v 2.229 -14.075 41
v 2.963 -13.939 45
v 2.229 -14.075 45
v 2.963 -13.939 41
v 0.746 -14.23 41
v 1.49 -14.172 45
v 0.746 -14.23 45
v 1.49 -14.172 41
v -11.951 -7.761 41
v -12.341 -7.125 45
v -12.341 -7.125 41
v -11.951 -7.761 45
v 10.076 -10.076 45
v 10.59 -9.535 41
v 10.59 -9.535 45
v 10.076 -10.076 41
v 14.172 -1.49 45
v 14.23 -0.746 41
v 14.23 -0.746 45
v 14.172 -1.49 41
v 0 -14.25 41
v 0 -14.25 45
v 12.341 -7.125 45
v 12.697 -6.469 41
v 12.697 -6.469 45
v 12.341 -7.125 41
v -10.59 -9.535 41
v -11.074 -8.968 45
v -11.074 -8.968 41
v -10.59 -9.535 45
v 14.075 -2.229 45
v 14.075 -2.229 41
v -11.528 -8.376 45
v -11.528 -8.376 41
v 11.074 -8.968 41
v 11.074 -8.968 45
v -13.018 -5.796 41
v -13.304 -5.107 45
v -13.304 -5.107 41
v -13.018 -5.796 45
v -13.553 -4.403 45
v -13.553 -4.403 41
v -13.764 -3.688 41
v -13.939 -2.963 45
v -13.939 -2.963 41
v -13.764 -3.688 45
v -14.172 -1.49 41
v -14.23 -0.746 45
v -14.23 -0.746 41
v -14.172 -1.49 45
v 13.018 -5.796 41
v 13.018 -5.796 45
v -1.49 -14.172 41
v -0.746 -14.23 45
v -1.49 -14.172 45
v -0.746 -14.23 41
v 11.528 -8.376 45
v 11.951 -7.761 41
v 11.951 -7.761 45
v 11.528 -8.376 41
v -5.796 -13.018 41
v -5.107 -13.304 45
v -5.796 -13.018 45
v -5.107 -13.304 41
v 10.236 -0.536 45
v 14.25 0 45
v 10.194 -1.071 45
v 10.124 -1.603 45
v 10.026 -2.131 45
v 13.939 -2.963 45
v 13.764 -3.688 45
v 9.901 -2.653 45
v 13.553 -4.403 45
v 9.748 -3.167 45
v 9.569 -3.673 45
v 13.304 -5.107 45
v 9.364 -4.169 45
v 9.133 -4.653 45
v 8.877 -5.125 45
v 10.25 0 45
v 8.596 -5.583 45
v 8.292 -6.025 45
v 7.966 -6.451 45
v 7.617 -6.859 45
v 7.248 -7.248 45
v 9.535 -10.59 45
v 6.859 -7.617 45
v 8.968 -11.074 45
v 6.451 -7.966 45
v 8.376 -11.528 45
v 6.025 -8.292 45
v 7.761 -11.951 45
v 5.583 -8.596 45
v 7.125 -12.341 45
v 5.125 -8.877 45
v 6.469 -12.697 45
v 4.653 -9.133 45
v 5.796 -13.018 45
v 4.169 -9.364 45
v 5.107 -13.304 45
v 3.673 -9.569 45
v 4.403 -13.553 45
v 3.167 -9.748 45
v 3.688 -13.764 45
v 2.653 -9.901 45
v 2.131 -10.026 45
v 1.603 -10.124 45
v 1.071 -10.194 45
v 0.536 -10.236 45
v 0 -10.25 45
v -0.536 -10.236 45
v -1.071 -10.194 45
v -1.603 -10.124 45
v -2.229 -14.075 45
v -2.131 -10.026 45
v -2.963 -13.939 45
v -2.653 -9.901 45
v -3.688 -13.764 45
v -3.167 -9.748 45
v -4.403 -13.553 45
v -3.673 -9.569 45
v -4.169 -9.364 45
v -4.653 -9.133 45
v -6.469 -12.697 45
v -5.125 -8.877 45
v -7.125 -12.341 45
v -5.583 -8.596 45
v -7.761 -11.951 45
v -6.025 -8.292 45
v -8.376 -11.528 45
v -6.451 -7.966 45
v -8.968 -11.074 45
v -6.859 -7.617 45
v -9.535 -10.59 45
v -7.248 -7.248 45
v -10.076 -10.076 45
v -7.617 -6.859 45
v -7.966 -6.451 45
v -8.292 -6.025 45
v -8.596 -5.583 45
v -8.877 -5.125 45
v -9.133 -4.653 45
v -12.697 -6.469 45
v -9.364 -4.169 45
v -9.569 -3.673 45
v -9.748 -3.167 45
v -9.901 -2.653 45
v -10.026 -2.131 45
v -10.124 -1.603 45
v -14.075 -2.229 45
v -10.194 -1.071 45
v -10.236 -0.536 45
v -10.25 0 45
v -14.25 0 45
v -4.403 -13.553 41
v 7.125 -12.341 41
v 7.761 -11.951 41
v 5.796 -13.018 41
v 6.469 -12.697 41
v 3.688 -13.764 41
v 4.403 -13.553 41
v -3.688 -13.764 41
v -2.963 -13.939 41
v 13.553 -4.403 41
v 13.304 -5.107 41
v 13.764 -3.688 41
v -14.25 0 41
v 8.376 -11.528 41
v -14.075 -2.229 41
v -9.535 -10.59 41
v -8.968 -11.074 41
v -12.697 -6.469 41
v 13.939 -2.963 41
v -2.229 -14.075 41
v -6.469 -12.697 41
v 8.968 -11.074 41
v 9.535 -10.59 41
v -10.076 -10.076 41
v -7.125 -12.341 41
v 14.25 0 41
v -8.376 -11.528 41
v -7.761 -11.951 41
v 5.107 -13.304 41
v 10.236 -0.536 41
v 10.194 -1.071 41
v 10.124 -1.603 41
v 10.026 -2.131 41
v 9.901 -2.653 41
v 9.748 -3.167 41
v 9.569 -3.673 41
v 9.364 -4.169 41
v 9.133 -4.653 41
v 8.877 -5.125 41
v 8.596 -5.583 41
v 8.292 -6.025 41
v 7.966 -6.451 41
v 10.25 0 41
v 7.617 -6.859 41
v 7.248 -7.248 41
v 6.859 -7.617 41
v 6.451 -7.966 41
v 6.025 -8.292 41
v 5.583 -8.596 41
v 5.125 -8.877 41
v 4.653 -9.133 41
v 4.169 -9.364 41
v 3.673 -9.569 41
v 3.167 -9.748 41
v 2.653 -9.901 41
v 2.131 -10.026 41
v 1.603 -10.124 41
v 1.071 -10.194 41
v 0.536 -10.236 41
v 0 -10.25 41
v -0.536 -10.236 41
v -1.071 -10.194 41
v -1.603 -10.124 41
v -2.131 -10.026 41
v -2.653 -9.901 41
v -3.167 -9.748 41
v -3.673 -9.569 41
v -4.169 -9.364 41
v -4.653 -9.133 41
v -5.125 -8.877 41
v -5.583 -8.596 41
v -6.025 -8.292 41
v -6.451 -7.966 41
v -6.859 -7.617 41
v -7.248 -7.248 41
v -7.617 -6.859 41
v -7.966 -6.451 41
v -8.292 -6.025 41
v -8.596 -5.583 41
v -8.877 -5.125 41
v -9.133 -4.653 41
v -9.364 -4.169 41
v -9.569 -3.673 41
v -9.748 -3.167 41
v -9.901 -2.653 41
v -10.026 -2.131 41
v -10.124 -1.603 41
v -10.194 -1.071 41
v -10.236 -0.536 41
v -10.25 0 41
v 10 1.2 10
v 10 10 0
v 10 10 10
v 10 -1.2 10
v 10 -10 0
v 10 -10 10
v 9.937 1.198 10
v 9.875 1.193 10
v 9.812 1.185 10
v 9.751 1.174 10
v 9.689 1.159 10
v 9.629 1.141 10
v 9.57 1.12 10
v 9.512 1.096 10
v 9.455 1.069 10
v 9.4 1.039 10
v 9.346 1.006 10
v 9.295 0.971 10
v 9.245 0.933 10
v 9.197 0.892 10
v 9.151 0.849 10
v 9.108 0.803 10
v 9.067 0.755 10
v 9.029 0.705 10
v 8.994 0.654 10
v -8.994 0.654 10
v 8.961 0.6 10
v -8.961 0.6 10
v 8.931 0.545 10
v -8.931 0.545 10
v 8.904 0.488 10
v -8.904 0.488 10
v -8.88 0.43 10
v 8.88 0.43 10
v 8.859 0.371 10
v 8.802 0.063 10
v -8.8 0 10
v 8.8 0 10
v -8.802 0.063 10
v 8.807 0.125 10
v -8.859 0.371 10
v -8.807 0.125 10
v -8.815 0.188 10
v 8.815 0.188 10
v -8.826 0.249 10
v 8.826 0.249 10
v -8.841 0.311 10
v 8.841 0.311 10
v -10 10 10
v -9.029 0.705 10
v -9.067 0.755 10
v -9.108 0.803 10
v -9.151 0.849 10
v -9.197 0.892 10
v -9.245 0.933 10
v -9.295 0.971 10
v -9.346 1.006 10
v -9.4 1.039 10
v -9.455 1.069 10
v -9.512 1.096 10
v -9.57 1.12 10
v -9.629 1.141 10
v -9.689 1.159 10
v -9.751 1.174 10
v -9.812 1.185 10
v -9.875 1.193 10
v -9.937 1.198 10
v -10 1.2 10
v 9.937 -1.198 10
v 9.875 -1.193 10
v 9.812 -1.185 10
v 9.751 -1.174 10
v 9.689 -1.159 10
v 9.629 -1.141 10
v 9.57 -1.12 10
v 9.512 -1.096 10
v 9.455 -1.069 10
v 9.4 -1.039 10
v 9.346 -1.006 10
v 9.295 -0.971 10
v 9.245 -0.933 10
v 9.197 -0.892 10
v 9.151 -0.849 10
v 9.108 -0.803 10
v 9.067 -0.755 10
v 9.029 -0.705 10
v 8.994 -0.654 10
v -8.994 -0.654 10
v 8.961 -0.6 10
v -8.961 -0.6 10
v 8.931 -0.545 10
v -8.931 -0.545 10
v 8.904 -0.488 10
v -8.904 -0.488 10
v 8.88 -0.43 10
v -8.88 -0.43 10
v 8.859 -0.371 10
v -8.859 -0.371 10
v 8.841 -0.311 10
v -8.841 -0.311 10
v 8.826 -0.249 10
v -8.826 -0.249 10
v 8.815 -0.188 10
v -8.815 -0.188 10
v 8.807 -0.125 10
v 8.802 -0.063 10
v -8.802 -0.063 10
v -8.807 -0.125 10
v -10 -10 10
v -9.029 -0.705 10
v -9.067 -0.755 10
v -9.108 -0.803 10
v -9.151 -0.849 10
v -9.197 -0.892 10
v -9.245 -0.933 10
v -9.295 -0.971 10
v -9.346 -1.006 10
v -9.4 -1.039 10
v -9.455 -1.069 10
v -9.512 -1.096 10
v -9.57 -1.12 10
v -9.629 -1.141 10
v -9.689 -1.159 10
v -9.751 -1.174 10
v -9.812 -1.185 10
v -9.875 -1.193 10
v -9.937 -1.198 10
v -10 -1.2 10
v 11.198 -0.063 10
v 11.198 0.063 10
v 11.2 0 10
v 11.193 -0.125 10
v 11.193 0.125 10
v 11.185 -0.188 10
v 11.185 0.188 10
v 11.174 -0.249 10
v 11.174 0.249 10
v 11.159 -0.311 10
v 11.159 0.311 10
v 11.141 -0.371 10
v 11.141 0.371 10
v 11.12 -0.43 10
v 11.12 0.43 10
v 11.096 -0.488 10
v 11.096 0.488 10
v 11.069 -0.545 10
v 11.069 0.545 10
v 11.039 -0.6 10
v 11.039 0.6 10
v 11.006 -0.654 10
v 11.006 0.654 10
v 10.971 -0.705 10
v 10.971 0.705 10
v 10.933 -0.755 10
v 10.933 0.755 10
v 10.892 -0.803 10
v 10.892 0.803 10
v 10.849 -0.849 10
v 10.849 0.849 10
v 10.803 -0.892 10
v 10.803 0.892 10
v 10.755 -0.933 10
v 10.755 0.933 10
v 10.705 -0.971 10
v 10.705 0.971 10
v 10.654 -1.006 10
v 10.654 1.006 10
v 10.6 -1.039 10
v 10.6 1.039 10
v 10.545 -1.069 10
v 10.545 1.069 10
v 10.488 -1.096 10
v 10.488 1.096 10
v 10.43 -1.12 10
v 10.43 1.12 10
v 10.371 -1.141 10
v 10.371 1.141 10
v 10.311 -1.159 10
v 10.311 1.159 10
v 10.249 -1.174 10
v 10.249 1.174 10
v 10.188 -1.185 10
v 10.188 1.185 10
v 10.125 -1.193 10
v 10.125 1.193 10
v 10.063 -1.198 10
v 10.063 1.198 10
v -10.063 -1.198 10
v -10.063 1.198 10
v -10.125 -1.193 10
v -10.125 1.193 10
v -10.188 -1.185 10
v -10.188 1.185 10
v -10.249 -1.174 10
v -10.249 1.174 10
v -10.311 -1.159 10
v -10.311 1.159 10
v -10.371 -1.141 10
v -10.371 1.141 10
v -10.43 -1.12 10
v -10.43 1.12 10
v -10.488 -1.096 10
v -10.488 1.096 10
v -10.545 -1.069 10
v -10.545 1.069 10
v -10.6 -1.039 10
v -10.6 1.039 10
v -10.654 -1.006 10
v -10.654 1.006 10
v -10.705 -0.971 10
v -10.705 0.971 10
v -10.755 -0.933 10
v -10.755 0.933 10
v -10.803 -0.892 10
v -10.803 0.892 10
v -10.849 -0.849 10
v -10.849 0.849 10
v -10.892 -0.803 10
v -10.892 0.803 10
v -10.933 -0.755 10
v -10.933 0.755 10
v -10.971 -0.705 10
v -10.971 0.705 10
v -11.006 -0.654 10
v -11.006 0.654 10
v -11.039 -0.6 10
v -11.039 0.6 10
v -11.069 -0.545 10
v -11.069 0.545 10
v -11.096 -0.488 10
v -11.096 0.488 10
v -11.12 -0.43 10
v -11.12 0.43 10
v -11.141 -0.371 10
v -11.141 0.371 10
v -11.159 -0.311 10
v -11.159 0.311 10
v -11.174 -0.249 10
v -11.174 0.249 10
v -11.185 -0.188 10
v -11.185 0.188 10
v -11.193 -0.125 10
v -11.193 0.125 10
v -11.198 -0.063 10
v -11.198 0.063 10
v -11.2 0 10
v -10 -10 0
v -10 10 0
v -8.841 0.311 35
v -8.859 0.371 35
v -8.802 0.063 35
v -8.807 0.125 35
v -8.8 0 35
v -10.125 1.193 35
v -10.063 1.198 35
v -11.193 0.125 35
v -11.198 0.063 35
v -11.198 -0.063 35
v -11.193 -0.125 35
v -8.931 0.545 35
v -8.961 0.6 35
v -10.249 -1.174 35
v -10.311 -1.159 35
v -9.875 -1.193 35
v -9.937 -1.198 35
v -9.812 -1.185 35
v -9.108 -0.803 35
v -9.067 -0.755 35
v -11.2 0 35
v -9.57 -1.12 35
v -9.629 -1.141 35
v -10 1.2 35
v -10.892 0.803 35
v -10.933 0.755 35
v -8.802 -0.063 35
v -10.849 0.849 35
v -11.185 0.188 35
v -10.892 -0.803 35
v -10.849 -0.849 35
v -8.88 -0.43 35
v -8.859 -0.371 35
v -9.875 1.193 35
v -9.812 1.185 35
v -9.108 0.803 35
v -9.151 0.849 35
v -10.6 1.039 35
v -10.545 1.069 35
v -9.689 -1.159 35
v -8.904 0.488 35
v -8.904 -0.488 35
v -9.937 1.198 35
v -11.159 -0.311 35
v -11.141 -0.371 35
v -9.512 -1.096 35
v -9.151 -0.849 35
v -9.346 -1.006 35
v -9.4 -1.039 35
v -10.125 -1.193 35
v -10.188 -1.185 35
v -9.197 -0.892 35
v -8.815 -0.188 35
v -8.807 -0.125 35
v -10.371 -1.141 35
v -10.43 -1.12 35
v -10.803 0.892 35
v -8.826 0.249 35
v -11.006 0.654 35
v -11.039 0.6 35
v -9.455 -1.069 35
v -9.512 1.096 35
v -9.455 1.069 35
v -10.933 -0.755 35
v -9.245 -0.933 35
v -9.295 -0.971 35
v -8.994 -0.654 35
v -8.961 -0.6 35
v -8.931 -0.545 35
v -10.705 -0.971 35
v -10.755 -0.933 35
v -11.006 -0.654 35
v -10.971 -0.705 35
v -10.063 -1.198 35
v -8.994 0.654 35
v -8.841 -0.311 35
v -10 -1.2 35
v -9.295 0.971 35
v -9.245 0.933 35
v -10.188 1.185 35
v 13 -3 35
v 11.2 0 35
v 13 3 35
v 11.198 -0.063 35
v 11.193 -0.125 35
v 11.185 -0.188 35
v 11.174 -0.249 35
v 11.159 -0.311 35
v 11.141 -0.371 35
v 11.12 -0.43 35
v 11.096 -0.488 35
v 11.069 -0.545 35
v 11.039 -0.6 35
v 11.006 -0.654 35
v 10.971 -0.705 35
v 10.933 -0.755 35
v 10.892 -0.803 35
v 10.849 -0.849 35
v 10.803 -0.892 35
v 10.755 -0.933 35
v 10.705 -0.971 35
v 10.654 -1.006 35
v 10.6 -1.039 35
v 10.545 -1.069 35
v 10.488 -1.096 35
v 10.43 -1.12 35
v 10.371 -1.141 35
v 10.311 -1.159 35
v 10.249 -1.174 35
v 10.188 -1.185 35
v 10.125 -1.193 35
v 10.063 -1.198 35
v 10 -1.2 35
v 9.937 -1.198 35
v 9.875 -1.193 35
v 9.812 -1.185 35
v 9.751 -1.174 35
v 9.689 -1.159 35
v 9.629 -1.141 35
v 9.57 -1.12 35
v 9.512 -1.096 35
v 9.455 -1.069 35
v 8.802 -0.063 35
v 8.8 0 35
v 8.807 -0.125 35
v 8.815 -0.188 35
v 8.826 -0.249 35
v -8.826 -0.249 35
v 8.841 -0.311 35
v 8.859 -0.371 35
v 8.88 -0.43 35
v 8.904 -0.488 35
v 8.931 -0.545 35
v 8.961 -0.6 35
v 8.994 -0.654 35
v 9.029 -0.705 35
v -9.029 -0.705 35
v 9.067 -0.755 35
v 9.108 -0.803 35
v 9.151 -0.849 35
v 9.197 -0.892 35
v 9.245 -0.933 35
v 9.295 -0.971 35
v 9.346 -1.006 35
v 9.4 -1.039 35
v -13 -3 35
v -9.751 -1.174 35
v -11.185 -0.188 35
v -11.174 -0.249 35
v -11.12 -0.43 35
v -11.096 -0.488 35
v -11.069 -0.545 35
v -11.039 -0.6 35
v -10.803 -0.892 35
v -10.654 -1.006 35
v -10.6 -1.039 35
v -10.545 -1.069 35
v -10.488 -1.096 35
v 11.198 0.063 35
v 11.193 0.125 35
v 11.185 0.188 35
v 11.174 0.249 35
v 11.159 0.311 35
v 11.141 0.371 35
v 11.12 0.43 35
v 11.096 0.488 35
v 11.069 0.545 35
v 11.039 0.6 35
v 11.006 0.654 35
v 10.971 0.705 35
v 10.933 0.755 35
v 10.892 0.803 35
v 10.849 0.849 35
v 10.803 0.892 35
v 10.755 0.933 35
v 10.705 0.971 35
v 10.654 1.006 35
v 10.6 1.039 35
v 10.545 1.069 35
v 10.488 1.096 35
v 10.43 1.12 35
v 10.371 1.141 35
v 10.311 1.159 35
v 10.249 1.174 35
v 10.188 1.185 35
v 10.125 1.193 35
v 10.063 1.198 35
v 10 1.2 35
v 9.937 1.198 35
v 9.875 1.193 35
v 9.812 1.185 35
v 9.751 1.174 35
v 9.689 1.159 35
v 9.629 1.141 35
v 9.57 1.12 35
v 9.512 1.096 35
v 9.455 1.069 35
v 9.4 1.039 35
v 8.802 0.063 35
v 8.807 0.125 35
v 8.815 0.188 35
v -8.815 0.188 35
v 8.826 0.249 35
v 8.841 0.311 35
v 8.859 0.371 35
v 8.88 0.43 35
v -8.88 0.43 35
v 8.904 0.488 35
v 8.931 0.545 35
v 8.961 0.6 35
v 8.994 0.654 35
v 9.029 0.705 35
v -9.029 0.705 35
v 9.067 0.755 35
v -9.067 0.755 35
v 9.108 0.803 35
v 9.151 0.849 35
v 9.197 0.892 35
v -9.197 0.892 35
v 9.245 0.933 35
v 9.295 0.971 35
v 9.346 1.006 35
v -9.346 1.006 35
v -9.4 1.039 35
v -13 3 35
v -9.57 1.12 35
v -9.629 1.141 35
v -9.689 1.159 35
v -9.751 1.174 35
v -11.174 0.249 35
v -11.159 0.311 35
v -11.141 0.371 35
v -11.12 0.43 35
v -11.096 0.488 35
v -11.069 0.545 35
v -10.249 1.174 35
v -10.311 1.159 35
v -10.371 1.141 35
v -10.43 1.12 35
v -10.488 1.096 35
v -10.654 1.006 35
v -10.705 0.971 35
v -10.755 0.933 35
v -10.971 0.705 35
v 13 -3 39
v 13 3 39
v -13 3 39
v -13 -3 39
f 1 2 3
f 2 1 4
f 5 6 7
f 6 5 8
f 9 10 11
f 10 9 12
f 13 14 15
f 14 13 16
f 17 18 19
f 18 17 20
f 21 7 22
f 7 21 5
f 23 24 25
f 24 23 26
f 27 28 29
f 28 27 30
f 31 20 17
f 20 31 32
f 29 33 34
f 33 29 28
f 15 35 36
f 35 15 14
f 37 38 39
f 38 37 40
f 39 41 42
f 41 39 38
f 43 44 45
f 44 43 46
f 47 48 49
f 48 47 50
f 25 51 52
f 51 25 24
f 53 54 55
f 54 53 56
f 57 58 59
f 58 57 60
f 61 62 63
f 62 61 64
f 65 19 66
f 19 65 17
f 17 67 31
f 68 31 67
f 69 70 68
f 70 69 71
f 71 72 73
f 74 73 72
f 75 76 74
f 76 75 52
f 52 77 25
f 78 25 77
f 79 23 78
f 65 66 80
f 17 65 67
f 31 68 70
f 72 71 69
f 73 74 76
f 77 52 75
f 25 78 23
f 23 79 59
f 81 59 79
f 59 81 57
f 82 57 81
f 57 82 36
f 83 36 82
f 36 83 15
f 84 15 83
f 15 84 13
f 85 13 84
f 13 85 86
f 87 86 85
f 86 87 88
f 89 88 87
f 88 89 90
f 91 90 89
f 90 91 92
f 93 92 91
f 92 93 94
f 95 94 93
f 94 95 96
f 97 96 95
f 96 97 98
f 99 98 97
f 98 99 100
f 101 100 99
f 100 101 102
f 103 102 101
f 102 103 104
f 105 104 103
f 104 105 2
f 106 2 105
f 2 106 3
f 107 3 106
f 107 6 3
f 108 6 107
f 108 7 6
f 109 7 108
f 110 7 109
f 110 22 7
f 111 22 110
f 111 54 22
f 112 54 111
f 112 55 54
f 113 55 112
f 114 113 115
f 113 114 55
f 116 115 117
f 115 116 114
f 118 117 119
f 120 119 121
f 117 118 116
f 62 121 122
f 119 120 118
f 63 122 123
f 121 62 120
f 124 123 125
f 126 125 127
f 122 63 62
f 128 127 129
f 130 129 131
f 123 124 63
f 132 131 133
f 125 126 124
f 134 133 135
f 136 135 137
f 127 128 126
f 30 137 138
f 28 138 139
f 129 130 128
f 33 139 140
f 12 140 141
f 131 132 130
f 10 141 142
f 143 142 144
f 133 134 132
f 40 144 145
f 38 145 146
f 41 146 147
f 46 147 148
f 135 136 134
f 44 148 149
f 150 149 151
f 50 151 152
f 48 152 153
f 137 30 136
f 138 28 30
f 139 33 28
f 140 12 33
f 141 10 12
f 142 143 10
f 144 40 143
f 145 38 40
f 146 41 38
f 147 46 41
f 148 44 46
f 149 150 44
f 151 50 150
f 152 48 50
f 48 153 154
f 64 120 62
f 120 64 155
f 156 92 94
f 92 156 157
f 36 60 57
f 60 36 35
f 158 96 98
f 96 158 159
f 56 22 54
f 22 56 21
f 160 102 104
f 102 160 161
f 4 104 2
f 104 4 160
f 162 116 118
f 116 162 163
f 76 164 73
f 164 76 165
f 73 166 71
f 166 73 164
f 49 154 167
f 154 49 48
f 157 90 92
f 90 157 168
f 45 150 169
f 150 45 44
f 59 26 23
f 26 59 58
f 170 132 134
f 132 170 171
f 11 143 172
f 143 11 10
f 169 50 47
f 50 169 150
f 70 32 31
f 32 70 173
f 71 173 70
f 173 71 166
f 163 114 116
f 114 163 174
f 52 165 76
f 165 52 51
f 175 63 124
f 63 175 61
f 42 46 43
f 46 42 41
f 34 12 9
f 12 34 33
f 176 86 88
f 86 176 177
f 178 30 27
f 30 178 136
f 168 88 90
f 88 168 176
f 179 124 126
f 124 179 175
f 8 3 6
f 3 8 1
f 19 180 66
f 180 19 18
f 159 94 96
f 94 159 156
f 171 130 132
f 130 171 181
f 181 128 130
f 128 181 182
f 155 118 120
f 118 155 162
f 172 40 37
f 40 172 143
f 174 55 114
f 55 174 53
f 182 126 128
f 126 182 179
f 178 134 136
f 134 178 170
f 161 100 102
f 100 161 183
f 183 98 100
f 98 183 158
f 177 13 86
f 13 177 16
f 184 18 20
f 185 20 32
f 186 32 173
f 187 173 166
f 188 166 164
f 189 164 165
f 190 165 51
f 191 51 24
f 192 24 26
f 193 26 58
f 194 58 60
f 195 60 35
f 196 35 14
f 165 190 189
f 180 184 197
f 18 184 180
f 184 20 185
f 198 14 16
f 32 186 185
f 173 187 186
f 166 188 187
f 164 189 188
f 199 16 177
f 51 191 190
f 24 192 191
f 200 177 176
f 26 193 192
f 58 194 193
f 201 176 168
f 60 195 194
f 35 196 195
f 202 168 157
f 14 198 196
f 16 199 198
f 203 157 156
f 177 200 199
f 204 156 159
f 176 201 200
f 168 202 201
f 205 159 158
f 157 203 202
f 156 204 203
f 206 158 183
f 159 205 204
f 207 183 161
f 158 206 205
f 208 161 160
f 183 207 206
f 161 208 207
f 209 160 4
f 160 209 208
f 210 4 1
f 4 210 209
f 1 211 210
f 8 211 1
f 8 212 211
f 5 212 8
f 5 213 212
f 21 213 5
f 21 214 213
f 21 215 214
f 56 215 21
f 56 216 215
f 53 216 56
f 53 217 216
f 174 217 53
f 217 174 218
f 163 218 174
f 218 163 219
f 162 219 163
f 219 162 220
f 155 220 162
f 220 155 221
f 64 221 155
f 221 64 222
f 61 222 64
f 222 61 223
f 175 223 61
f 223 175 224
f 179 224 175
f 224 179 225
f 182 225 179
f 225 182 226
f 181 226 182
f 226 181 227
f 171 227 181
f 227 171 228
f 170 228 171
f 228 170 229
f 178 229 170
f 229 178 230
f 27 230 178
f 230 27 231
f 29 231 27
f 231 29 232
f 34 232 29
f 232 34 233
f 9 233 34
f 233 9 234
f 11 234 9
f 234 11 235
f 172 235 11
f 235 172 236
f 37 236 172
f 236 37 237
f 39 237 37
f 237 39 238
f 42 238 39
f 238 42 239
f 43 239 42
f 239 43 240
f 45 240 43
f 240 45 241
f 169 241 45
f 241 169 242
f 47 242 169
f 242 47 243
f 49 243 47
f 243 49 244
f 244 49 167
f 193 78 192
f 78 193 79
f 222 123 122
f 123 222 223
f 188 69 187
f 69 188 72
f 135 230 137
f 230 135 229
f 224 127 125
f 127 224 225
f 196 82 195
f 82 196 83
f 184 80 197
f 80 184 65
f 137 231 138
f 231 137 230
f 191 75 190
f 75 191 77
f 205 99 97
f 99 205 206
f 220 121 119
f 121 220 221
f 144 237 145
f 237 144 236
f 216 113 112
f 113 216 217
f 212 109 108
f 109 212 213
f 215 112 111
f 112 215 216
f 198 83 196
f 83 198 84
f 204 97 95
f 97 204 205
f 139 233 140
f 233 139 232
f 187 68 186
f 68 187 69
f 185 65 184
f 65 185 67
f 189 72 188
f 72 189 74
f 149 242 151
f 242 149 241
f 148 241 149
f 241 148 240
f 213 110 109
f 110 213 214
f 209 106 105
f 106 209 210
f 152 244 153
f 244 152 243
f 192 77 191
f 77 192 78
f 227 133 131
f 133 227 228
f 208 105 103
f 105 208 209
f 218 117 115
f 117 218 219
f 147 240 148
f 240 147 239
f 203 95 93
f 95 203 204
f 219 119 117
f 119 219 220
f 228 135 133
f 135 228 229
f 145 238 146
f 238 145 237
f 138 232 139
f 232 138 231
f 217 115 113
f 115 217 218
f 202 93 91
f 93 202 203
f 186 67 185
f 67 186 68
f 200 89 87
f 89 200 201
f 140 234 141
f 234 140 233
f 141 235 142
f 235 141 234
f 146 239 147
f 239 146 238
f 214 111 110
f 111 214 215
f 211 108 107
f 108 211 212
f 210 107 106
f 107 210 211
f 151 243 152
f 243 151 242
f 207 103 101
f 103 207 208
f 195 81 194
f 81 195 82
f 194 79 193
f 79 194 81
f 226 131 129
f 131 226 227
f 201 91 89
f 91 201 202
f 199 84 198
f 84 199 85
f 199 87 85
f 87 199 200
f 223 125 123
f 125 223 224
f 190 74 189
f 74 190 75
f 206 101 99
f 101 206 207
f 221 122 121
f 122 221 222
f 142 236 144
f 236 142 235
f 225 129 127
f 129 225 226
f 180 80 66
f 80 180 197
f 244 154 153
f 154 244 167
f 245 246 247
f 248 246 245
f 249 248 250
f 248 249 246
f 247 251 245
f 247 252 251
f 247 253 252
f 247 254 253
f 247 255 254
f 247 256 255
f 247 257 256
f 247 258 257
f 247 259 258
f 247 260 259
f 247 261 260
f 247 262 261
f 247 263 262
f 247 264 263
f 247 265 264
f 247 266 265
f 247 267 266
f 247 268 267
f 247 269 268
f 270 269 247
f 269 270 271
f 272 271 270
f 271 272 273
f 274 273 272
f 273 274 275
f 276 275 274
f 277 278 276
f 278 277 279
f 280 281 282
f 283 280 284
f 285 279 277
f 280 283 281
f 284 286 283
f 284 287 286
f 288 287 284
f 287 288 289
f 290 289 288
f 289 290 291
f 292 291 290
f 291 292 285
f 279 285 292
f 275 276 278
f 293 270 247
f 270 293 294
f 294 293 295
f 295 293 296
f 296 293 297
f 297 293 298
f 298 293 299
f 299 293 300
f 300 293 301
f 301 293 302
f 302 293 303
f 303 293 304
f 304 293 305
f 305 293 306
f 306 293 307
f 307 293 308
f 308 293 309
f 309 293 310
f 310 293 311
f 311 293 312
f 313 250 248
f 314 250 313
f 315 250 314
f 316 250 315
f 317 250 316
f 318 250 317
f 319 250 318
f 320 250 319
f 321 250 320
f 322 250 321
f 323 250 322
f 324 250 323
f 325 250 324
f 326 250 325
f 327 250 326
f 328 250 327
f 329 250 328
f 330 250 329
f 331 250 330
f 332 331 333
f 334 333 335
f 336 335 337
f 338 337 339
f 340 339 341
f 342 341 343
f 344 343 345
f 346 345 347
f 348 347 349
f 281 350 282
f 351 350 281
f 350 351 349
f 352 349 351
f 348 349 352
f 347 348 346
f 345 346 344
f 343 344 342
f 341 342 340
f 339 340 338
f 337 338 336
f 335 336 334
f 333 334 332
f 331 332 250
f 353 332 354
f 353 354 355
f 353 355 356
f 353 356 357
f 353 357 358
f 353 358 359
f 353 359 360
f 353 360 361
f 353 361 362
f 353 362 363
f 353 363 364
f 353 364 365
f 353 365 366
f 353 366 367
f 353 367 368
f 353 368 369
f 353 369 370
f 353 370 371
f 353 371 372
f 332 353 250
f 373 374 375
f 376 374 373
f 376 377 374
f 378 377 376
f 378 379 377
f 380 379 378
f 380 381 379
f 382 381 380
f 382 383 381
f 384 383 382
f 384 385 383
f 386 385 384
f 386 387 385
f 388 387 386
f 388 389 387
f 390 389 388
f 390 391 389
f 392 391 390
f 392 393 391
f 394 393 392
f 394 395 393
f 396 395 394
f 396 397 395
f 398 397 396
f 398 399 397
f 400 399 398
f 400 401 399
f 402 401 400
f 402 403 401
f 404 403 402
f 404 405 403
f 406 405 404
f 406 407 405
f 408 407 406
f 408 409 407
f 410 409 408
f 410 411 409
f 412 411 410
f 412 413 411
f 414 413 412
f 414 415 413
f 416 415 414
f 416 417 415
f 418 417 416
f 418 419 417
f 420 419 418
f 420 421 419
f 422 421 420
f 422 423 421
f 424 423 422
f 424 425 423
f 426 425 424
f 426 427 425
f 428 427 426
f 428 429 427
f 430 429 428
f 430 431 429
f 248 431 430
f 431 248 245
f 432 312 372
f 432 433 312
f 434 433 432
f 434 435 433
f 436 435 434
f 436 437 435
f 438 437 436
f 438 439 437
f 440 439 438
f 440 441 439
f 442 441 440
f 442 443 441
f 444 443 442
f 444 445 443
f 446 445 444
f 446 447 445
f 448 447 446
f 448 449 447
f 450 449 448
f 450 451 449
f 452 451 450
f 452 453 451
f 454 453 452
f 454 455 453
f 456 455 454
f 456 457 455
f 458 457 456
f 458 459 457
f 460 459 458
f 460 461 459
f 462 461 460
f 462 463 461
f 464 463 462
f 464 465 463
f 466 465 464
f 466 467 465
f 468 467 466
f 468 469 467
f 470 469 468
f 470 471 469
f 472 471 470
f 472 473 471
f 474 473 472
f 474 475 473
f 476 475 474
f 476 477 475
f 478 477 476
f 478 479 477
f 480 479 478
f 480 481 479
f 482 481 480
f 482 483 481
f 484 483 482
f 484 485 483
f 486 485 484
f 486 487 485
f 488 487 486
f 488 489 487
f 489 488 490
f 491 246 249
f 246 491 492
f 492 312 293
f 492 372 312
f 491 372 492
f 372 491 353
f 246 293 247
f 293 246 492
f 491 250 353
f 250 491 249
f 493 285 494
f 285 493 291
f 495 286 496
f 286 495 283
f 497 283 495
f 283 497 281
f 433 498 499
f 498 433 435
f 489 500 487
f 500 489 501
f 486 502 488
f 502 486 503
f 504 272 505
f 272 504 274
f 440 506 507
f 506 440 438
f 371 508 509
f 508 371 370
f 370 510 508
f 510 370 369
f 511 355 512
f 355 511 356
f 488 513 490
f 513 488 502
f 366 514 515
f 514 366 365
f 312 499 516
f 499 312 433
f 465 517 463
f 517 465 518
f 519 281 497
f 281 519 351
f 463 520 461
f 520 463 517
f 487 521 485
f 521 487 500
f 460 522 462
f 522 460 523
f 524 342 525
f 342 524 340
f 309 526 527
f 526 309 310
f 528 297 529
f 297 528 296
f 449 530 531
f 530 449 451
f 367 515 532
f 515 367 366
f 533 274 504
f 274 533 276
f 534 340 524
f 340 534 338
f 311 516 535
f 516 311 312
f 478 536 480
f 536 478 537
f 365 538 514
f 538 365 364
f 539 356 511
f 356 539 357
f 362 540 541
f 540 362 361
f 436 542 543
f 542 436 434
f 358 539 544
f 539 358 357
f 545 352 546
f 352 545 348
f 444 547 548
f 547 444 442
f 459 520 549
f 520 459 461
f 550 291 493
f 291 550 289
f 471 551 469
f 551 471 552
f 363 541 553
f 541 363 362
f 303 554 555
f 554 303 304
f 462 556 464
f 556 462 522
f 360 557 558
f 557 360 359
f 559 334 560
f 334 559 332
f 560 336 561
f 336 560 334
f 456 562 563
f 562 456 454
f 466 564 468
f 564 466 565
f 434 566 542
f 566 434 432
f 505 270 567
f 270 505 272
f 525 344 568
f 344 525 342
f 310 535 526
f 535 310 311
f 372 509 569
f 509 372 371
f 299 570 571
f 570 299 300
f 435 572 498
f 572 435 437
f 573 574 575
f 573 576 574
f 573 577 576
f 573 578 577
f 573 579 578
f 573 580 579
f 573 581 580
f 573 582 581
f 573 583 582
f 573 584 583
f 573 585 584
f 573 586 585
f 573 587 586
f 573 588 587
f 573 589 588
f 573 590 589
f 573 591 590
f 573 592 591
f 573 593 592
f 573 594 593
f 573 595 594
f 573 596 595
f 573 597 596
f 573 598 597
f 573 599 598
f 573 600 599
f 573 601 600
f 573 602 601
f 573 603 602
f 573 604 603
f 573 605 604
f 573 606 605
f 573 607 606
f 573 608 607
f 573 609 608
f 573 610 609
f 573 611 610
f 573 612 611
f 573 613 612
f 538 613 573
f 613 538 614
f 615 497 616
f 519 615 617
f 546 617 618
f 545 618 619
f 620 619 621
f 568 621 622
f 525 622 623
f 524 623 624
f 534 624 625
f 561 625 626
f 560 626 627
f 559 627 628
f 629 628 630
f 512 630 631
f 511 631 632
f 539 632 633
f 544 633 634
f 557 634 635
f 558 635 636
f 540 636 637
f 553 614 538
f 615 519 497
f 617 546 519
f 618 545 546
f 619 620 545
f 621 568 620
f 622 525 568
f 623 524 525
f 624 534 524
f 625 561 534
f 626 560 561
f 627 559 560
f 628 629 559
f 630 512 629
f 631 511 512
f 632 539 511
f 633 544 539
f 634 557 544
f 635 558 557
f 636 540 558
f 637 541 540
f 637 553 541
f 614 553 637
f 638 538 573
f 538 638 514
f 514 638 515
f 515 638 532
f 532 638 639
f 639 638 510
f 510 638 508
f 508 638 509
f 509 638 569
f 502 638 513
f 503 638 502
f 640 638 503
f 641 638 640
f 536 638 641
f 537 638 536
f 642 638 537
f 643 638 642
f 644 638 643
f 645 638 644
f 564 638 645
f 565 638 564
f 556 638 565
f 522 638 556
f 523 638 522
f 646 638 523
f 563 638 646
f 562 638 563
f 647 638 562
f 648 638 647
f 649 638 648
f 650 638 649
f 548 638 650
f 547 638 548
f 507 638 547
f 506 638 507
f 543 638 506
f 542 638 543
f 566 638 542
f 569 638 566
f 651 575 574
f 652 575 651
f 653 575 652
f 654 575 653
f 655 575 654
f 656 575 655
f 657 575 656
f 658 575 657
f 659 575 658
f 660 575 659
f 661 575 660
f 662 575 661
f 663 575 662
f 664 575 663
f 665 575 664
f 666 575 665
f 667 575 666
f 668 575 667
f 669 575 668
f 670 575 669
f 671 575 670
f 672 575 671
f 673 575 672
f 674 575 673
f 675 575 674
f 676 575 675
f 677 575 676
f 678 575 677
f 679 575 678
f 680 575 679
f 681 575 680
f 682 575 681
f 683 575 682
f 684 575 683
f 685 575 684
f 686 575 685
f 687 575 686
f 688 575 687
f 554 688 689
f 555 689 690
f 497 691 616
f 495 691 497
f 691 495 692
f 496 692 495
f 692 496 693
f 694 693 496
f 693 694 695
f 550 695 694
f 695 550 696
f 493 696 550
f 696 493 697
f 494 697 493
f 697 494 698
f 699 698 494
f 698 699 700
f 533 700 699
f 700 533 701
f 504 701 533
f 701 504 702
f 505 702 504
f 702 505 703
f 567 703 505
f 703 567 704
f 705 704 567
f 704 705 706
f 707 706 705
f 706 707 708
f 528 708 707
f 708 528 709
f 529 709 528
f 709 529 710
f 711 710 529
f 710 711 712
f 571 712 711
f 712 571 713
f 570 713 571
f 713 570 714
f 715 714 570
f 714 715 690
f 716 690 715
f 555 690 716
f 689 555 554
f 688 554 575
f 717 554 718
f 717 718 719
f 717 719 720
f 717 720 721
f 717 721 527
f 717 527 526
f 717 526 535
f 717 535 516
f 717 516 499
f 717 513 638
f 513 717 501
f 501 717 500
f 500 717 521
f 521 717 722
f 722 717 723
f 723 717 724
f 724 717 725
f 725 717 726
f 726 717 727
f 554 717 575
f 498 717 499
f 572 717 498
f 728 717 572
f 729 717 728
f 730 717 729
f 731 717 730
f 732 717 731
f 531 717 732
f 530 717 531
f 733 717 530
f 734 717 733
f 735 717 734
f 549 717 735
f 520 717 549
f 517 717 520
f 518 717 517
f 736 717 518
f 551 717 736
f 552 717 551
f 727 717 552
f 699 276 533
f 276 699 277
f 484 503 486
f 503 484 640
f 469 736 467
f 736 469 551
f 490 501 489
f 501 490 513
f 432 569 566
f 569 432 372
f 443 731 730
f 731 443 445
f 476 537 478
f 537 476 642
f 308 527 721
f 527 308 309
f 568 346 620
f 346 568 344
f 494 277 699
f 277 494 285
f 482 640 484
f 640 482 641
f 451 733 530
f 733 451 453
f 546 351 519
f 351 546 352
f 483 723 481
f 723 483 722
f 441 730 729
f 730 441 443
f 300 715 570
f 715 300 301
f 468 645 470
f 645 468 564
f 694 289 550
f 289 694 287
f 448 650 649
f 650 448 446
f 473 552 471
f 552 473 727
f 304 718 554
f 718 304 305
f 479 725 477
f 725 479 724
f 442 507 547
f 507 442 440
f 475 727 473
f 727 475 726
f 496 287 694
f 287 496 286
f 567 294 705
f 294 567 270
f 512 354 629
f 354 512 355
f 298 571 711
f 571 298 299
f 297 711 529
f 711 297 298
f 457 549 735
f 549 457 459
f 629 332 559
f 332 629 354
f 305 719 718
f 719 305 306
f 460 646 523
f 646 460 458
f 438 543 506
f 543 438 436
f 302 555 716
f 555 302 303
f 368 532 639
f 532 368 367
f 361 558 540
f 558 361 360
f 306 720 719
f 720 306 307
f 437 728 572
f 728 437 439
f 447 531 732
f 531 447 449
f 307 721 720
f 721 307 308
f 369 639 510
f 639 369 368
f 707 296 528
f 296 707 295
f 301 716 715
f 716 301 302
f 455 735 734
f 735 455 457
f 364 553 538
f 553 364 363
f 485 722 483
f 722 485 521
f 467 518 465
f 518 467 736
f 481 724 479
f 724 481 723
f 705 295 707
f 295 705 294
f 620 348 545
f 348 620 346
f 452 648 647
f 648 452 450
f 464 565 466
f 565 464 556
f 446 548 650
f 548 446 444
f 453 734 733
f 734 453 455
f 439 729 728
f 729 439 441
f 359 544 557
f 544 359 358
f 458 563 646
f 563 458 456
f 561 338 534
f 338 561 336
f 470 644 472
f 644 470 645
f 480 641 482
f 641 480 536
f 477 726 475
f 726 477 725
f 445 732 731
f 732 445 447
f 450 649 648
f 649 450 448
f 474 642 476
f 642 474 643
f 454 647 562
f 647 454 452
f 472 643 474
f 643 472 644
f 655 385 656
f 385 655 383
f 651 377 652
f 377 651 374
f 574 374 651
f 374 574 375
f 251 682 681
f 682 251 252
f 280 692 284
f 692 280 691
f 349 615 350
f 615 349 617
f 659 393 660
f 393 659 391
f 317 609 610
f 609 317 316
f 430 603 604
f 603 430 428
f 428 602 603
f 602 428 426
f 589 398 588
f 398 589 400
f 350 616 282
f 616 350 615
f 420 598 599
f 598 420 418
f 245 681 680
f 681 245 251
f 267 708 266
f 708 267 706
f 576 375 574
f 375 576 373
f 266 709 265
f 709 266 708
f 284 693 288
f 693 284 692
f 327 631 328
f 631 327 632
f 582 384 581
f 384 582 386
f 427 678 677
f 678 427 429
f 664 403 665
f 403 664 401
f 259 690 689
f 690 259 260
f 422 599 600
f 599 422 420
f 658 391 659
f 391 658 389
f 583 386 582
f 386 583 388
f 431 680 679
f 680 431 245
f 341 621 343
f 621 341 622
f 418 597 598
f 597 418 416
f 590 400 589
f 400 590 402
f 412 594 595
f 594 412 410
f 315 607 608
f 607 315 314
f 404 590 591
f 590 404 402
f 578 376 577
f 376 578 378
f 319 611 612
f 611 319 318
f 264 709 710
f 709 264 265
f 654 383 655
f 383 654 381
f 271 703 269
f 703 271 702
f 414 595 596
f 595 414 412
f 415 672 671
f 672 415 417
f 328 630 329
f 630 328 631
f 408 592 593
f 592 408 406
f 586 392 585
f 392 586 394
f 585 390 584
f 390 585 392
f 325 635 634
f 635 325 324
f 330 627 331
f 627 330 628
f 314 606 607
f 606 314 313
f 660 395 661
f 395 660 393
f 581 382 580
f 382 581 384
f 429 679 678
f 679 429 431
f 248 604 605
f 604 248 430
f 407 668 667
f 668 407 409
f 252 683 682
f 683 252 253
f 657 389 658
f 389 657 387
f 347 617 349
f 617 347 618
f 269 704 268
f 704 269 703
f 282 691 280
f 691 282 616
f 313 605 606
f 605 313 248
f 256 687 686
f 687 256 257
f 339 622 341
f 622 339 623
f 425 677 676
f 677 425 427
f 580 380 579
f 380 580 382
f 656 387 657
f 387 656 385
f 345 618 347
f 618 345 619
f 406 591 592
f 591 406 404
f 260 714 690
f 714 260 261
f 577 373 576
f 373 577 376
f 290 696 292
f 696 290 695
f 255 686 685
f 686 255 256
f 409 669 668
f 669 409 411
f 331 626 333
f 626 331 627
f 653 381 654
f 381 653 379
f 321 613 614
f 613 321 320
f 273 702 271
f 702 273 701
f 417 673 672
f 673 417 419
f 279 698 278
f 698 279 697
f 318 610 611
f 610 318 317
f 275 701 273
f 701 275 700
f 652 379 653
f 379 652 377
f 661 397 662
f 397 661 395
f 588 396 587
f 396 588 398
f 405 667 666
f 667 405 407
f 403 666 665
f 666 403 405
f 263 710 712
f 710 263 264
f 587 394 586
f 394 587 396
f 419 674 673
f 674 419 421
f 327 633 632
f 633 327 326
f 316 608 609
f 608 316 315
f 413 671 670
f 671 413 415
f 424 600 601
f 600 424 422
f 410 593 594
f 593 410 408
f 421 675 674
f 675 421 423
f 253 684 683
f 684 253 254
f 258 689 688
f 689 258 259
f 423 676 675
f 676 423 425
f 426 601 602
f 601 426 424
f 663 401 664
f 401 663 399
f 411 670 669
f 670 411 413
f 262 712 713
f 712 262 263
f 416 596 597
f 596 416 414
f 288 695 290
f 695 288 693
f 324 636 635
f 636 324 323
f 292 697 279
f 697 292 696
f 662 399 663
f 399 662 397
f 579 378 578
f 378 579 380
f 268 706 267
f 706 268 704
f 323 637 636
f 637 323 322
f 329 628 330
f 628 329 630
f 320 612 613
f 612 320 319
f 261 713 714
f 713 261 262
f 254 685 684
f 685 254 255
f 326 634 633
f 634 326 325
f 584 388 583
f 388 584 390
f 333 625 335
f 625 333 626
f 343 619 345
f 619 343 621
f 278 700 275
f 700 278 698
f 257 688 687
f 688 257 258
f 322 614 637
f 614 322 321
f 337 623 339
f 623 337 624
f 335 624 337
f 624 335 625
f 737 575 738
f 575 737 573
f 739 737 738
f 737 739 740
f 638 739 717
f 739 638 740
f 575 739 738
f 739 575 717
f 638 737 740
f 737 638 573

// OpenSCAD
//
// Dual-Probe Assembly with Semi-Circular Servo Horn (Fixed Syntax)
// The horn covers both probes when centered and frees the left probe when rotated right.
//
// Author: ChatGPT
//

// ===== PARAMETERS =====
probe_dia = 2.0;
spring_od = 4.5;
probe_spacing = 20.0;
guide_height = 25.0;
base_thickness = 10.0;
crossbar_thickness = 4.0;

horn_outer_R = probe_spacing / 2 + spring_od / 2 + 2.0;
horn_radial_thk = 4.0;
horn_z_thk = 4.0;
horn_z_offset = 2.0;
pivot_hole_dia = 4.0;

pocket_arc_angle = 50;    // how wide the cutout is
pocket_radial_extra = 6;  // how deep inward it goes
pocket_depth = 3;         // how far up into horn it cuts

$fn = 120;

// ===== MODULES =====

module base_plate() {
    translate([-10, -10, 0])
        cube([20, 20, base_thickness]);
}

module probe_guide(xoff) {
    translate([xoff, 0, base_thickness])
        cylinder(h = guide_height, d = probe_dia + 0.4);
}

module crossbar() {
    translate([-probe_spacing/2 - 3, -3, base_thickness + guide_height])
        cube([probe_spacing + 6, 6, crossbar_thickness]);
}

// Semi-circle horn with underside pocket
module semicircle_horn_with_pocket() {
    outer_R = horn_outer_R;
    inner_R = outer_R - horn_radial_thk;
    horn_z = base_thickness + guide_height + crossbar_thickness + horn_z_offset;

    // Base semi-circle (front half only)
    difference() {
        // Full ring
        translate([0,0,horn_z])
            difference() {
                cylinder(h = horn_z_thk, r = outer_R);
                translate([0,0,-0.1]) cylinder(h = horn_z_thk + 0.2, r = inner_R);
            }

        // Cut away back half so only front semi-circle remains
        translate([-outer_R, 0, horn_z - 1])
            cube([2*outer_R, outer_R, horn_z_thk + 2]);

        // Create pocket on right side (to free left probe when horn rotates right)
        rotate([0,0,-pocket_arc_angle/2])
            translate([0,0,horn_z - pocket_depth])
                intersection() {
                    // annular section to cut into horn
                    difference() {
                        cylinder(h = pocket_depth + 1, r = outer_R + 1);
                        translate([0,0,-0.1]) cylinder(h = pocket_depth + 1.2, r = inner_R - pocket_radial_extra);
                    }
                    // limit pocket angular extent
                    rotate_extrude(angle = pocket_arc_angle)
                        translate([inner_R - pocket_radial_extra,0,0])
                            square([outer_R - inner_R + pocket_radial_extra + 1, 1]);
                }

        // Pivot hole
        translate([0,0,horn_z - 1])
            cylinder(h = horn_z_thk + 2, d = pivot_hole_dia);
    }
}

// ===== ASSEMBLY =====
union() {
    base_plate();
    probe_guide(-probe_spacing/2);
    probe_guide(probe_spacing/2);
    crossbar();
    semicircle_horn_with_pocket();
}
